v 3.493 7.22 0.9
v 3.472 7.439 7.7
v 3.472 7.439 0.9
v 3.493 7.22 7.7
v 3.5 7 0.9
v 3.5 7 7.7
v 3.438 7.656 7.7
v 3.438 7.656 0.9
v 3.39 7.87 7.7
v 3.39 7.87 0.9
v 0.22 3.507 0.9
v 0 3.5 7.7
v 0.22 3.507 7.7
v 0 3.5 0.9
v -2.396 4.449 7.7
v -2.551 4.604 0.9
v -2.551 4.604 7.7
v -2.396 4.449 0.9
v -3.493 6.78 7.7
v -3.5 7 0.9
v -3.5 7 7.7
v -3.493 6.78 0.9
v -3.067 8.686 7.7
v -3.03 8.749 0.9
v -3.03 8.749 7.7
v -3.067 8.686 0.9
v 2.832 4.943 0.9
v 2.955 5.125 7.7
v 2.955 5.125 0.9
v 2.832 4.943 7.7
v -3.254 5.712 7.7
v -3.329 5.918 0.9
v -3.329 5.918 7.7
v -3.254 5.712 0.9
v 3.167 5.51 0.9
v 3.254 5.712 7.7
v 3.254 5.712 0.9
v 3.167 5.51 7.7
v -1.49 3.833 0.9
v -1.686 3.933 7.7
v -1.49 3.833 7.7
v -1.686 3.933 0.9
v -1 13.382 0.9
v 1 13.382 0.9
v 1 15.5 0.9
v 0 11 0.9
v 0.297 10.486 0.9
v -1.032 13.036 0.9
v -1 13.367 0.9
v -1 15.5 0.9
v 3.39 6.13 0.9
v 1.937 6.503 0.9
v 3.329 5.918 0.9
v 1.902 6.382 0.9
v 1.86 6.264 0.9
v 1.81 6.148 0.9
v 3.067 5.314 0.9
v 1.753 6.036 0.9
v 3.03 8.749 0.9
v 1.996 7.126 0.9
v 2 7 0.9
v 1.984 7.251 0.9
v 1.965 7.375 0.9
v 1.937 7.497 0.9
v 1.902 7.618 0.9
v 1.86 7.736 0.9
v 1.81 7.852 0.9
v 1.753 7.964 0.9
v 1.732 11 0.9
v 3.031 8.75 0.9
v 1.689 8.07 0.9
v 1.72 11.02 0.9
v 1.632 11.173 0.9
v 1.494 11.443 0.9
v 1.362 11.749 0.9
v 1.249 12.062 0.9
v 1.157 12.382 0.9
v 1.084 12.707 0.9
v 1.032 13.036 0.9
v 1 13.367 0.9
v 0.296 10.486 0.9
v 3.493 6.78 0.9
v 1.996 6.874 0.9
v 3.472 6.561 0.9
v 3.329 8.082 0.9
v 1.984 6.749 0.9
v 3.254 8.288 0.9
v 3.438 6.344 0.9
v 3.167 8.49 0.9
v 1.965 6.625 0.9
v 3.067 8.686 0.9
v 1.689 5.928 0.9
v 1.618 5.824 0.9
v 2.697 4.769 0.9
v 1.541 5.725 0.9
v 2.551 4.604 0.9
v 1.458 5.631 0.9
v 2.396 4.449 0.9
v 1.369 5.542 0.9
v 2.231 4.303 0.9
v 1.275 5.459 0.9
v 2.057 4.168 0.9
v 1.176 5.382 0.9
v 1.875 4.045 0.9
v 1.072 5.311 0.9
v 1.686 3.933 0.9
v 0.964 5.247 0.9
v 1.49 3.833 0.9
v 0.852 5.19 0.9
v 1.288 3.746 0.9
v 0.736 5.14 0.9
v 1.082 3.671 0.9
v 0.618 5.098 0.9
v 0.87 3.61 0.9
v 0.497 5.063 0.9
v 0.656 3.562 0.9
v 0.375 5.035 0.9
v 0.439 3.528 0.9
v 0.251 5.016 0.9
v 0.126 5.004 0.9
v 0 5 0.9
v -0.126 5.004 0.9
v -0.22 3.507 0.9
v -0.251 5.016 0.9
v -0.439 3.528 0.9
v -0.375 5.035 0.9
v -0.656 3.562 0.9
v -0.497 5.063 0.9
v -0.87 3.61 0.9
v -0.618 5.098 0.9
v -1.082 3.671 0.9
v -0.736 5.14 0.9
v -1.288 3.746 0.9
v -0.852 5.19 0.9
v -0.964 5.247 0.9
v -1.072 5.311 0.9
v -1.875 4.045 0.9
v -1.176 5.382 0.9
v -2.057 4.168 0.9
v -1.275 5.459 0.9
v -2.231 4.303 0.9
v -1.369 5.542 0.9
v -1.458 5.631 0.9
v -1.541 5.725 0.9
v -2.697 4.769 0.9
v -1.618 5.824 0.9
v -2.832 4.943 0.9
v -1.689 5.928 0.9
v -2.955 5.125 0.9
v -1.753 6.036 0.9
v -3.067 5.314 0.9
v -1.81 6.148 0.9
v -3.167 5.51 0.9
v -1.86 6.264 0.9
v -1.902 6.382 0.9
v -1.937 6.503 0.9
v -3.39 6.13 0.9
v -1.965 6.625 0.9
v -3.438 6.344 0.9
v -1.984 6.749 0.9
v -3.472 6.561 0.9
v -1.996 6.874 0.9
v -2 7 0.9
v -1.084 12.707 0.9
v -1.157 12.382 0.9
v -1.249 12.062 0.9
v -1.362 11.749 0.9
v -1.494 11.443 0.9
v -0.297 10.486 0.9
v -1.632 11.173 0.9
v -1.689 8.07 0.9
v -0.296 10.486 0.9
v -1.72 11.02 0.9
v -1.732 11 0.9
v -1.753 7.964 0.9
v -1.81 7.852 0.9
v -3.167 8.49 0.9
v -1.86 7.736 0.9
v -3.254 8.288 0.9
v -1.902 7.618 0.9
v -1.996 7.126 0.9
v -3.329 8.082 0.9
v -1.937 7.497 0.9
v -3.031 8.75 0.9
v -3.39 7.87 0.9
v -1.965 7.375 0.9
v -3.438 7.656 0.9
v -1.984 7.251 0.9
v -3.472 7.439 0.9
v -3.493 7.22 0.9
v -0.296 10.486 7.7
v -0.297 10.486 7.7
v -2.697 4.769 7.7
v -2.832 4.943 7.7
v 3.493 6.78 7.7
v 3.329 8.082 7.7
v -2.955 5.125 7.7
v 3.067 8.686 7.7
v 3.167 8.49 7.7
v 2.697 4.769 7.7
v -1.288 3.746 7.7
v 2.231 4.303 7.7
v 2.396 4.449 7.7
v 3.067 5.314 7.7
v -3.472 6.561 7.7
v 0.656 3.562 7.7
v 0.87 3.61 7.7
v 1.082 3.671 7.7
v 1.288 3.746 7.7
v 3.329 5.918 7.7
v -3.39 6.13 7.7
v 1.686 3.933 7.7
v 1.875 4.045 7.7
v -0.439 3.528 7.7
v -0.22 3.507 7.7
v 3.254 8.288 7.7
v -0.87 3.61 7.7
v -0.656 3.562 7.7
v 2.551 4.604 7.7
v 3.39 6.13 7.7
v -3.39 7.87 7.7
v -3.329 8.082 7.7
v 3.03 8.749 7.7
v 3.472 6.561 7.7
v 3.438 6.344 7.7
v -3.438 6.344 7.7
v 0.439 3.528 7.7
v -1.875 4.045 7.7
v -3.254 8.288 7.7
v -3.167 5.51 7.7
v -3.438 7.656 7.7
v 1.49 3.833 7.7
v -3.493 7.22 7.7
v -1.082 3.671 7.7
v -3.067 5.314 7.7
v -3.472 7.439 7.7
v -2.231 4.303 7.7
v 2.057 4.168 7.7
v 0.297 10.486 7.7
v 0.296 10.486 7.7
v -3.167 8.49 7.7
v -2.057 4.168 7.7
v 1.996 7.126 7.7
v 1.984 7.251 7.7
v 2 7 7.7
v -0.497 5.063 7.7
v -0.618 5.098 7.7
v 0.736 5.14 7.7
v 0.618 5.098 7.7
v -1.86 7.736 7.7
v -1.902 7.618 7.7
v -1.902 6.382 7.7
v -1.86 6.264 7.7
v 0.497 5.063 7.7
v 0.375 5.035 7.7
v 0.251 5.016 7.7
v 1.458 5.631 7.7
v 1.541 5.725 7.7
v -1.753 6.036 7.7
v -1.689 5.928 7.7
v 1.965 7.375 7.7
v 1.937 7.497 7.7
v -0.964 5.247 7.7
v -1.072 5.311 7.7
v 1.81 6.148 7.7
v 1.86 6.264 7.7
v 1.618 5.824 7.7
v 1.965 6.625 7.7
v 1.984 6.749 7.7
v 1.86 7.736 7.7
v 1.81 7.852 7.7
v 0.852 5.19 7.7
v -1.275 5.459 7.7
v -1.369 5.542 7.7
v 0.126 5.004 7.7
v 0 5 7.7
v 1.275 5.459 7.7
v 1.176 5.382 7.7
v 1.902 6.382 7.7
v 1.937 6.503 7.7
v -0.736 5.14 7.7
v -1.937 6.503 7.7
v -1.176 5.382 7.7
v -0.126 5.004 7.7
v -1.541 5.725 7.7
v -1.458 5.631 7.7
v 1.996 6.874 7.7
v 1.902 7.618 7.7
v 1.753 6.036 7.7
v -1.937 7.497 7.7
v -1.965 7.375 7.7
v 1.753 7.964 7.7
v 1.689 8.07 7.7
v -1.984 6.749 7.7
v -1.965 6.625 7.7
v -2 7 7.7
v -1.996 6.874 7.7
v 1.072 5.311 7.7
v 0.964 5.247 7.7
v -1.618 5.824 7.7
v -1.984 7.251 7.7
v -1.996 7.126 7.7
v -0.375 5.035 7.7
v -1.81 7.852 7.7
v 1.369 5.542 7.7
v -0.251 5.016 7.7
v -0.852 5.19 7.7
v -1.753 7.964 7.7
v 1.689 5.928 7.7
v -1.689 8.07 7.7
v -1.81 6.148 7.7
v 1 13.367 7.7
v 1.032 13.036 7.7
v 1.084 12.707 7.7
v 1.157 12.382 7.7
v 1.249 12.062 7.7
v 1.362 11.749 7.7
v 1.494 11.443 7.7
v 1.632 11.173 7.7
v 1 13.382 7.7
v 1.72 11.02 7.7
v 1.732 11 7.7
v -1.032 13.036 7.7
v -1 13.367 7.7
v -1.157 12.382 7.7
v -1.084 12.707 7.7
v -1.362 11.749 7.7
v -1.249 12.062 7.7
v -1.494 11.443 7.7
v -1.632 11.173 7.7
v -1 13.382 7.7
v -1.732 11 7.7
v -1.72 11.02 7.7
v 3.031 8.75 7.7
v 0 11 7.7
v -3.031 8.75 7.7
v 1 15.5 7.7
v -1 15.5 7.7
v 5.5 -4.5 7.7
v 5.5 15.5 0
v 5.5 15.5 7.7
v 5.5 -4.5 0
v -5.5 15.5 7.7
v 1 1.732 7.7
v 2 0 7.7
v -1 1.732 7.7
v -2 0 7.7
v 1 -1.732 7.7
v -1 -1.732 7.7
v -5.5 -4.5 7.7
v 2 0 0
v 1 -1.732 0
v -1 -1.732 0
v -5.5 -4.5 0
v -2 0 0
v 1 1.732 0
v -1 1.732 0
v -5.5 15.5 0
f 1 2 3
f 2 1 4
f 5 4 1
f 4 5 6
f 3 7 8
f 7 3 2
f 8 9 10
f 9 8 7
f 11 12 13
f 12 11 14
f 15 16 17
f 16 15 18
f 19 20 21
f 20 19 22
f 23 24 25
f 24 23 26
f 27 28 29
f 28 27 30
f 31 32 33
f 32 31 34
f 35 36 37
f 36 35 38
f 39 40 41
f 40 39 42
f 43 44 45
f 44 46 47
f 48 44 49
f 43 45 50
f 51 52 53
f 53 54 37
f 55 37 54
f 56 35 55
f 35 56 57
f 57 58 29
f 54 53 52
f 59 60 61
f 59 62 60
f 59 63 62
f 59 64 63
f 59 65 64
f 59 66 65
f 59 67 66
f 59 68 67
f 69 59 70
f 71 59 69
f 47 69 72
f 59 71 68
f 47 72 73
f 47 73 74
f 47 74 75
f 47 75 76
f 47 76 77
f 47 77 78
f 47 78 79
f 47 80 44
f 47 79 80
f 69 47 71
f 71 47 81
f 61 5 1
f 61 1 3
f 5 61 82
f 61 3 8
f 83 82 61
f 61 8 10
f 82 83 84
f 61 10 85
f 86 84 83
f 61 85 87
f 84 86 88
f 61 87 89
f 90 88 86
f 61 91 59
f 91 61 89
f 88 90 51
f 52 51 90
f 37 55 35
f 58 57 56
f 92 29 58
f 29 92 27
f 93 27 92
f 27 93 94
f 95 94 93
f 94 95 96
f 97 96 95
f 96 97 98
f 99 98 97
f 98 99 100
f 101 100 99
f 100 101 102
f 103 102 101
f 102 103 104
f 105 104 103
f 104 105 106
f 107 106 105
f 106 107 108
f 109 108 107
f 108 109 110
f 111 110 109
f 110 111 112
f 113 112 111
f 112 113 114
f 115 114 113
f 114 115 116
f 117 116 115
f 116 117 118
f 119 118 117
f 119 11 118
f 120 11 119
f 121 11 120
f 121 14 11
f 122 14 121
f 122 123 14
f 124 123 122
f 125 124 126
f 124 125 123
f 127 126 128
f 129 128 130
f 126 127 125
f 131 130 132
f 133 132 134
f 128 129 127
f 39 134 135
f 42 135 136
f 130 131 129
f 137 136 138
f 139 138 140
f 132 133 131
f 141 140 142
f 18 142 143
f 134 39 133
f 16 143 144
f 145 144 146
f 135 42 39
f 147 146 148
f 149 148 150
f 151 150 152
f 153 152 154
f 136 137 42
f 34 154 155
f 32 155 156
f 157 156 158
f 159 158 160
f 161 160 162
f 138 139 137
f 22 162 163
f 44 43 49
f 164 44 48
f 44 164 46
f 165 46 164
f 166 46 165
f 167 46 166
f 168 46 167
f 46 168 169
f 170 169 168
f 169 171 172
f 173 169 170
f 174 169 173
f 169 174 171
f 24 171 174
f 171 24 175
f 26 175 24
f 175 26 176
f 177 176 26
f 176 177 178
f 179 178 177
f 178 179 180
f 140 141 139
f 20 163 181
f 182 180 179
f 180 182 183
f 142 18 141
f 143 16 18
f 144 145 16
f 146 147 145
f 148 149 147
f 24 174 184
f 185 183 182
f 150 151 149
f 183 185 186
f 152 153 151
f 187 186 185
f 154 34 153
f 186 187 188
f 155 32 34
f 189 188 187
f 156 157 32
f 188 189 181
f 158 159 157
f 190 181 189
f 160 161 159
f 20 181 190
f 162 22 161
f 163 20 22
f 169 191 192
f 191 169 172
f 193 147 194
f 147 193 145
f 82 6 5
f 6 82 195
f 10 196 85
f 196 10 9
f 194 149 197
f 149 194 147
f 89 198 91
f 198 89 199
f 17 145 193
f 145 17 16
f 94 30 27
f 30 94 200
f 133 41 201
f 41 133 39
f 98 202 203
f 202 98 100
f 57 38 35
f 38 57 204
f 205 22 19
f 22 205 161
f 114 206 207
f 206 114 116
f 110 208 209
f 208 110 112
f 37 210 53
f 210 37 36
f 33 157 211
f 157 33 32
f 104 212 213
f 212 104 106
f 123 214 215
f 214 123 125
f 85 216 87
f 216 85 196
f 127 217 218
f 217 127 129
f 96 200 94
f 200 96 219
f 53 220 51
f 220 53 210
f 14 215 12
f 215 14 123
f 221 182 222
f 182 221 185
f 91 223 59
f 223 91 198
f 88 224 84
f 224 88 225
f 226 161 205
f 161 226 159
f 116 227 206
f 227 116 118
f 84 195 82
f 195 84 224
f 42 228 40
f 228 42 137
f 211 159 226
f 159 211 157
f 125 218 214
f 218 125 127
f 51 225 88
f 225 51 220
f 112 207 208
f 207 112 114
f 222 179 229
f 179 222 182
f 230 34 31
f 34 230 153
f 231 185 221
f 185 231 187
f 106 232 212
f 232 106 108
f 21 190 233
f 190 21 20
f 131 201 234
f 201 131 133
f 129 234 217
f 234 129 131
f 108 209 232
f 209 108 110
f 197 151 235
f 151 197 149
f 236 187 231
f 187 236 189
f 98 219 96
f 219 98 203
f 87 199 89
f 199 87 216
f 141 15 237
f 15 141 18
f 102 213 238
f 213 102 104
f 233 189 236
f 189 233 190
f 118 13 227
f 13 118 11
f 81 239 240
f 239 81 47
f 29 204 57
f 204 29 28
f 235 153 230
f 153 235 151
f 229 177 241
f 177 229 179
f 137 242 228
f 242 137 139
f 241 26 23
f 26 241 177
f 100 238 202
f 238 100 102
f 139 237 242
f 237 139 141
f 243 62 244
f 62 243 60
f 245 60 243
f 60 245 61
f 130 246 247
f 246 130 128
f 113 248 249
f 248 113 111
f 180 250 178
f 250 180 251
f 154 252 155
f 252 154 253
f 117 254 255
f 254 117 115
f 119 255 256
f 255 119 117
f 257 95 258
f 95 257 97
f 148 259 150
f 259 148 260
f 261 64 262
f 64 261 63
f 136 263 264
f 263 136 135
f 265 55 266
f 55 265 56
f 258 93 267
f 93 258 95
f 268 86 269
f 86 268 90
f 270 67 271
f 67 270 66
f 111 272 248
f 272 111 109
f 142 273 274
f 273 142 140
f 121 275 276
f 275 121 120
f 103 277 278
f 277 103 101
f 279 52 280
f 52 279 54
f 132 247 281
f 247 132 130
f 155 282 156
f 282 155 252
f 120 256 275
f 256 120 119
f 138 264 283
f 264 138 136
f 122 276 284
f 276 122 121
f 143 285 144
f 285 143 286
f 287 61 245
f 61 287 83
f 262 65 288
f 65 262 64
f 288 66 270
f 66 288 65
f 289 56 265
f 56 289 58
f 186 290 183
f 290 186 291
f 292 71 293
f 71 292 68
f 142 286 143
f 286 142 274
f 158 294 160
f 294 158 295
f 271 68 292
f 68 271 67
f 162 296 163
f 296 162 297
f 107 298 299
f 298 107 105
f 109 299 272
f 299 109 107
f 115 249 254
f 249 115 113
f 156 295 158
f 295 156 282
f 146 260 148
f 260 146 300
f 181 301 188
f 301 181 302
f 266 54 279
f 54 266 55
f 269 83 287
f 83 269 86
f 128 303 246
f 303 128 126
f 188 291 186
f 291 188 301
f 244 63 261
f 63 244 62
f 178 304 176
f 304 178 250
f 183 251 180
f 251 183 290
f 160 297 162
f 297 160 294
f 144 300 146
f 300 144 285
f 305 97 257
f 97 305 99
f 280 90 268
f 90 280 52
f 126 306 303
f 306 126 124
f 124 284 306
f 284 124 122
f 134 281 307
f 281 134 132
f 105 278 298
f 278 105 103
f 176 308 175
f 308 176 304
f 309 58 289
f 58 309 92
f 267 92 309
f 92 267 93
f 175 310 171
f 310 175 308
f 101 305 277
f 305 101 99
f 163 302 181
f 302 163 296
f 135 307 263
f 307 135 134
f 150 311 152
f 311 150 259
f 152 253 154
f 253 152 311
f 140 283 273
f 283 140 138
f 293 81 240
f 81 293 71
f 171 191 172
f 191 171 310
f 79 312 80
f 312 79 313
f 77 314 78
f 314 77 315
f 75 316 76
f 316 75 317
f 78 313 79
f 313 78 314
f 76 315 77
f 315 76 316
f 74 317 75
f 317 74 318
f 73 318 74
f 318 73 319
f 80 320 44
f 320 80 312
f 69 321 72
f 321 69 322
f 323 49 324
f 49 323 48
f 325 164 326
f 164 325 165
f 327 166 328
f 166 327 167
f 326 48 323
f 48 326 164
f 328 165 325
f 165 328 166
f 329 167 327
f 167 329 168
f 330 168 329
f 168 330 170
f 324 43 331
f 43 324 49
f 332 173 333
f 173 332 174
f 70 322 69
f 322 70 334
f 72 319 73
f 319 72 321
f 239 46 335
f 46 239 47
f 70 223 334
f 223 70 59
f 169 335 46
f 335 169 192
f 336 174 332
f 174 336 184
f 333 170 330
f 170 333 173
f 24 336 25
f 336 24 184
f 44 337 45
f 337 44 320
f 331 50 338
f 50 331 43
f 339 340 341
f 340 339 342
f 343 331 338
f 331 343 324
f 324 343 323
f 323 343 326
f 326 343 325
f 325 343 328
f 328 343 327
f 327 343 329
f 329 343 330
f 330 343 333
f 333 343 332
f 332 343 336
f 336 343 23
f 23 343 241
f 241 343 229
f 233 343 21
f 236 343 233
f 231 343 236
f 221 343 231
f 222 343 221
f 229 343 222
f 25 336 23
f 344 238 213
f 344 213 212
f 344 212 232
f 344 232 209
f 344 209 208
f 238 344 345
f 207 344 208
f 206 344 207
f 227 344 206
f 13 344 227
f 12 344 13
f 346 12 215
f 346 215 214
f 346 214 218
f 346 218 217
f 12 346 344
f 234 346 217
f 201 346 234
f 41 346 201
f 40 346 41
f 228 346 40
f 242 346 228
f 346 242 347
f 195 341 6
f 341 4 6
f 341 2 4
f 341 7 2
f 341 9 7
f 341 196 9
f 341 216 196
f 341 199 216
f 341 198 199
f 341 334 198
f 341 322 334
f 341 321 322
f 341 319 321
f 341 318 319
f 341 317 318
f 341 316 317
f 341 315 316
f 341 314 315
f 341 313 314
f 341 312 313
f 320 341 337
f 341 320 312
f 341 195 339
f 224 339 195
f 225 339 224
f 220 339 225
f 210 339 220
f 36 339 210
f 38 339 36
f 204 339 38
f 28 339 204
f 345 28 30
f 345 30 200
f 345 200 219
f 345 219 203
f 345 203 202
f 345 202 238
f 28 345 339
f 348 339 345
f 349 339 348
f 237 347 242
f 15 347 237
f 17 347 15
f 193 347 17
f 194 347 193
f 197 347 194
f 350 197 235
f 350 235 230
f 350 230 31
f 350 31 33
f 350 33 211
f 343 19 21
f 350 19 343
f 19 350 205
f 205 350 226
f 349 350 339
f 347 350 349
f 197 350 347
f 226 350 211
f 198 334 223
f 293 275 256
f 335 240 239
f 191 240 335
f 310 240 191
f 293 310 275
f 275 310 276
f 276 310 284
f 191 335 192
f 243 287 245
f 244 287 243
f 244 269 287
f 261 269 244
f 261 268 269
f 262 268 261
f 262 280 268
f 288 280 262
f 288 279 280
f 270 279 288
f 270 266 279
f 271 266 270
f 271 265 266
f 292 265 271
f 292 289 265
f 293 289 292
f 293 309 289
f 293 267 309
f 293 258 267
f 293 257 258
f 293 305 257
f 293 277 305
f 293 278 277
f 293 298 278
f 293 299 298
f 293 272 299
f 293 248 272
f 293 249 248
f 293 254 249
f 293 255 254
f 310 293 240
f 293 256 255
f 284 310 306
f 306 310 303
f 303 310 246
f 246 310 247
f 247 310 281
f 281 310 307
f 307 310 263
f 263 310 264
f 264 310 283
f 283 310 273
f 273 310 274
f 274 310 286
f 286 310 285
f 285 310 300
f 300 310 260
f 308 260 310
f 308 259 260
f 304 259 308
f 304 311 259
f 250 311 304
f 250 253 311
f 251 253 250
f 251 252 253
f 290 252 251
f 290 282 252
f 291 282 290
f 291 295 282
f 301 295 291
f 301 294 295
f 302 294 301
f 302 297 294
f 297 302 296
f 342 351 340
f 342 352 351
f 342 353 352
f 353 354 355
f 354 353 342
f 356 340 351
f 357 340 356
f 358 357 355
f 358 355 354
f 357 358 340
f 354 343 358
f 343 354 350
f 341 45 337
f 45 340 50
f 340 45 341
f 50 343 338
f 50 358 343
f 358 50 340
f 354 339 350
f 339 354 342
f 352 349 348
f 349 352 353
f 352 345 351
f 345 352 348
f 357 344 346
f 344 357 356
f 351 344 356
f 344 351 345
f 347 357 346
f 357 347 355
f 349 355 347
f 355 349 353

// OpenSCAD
height=8-0.3;
bottom=1.2-0.3;
width=11;

difference() {
    translate([0,20/2-9/2,height/2]) cube([width,20,height], true);
    translate([0,0,-0.1]) cylinder(r=2,h=height+bottom, $fn=6);
    translate([0,7,bottom]) belt();
}

module belt() {
    difference() {
        $fn=100;
        cylinder(r=2+1.5,h=height);
        translate([0,0,-0.1]) cylinder(r=2,h=height+bottom);
        linear_extrude(height = 100, center = true)
            polygon(points=[[-1.73,1],[1.73,1],[0,4]]);
    }
    rotate([0,0,30]) translate([2,0,0]) cube([1.5,5,height]);
    rotate([0,0,-30]) translate([-2-1.5,0,0]) cube([1.5,5,height]);
    
    translate([-2/2,5,0]) cube([2,10,height]);
    
    curve();
    mirror([1,0,0]) curve();
}

module curve() {
     difference() {
        translate([0,4,0]) cube([2,3,height]);
        translate([6.29,6.7,-0.1]) cylinder(r=5.3,h=height+bottom,$fn=100);
    }
}
